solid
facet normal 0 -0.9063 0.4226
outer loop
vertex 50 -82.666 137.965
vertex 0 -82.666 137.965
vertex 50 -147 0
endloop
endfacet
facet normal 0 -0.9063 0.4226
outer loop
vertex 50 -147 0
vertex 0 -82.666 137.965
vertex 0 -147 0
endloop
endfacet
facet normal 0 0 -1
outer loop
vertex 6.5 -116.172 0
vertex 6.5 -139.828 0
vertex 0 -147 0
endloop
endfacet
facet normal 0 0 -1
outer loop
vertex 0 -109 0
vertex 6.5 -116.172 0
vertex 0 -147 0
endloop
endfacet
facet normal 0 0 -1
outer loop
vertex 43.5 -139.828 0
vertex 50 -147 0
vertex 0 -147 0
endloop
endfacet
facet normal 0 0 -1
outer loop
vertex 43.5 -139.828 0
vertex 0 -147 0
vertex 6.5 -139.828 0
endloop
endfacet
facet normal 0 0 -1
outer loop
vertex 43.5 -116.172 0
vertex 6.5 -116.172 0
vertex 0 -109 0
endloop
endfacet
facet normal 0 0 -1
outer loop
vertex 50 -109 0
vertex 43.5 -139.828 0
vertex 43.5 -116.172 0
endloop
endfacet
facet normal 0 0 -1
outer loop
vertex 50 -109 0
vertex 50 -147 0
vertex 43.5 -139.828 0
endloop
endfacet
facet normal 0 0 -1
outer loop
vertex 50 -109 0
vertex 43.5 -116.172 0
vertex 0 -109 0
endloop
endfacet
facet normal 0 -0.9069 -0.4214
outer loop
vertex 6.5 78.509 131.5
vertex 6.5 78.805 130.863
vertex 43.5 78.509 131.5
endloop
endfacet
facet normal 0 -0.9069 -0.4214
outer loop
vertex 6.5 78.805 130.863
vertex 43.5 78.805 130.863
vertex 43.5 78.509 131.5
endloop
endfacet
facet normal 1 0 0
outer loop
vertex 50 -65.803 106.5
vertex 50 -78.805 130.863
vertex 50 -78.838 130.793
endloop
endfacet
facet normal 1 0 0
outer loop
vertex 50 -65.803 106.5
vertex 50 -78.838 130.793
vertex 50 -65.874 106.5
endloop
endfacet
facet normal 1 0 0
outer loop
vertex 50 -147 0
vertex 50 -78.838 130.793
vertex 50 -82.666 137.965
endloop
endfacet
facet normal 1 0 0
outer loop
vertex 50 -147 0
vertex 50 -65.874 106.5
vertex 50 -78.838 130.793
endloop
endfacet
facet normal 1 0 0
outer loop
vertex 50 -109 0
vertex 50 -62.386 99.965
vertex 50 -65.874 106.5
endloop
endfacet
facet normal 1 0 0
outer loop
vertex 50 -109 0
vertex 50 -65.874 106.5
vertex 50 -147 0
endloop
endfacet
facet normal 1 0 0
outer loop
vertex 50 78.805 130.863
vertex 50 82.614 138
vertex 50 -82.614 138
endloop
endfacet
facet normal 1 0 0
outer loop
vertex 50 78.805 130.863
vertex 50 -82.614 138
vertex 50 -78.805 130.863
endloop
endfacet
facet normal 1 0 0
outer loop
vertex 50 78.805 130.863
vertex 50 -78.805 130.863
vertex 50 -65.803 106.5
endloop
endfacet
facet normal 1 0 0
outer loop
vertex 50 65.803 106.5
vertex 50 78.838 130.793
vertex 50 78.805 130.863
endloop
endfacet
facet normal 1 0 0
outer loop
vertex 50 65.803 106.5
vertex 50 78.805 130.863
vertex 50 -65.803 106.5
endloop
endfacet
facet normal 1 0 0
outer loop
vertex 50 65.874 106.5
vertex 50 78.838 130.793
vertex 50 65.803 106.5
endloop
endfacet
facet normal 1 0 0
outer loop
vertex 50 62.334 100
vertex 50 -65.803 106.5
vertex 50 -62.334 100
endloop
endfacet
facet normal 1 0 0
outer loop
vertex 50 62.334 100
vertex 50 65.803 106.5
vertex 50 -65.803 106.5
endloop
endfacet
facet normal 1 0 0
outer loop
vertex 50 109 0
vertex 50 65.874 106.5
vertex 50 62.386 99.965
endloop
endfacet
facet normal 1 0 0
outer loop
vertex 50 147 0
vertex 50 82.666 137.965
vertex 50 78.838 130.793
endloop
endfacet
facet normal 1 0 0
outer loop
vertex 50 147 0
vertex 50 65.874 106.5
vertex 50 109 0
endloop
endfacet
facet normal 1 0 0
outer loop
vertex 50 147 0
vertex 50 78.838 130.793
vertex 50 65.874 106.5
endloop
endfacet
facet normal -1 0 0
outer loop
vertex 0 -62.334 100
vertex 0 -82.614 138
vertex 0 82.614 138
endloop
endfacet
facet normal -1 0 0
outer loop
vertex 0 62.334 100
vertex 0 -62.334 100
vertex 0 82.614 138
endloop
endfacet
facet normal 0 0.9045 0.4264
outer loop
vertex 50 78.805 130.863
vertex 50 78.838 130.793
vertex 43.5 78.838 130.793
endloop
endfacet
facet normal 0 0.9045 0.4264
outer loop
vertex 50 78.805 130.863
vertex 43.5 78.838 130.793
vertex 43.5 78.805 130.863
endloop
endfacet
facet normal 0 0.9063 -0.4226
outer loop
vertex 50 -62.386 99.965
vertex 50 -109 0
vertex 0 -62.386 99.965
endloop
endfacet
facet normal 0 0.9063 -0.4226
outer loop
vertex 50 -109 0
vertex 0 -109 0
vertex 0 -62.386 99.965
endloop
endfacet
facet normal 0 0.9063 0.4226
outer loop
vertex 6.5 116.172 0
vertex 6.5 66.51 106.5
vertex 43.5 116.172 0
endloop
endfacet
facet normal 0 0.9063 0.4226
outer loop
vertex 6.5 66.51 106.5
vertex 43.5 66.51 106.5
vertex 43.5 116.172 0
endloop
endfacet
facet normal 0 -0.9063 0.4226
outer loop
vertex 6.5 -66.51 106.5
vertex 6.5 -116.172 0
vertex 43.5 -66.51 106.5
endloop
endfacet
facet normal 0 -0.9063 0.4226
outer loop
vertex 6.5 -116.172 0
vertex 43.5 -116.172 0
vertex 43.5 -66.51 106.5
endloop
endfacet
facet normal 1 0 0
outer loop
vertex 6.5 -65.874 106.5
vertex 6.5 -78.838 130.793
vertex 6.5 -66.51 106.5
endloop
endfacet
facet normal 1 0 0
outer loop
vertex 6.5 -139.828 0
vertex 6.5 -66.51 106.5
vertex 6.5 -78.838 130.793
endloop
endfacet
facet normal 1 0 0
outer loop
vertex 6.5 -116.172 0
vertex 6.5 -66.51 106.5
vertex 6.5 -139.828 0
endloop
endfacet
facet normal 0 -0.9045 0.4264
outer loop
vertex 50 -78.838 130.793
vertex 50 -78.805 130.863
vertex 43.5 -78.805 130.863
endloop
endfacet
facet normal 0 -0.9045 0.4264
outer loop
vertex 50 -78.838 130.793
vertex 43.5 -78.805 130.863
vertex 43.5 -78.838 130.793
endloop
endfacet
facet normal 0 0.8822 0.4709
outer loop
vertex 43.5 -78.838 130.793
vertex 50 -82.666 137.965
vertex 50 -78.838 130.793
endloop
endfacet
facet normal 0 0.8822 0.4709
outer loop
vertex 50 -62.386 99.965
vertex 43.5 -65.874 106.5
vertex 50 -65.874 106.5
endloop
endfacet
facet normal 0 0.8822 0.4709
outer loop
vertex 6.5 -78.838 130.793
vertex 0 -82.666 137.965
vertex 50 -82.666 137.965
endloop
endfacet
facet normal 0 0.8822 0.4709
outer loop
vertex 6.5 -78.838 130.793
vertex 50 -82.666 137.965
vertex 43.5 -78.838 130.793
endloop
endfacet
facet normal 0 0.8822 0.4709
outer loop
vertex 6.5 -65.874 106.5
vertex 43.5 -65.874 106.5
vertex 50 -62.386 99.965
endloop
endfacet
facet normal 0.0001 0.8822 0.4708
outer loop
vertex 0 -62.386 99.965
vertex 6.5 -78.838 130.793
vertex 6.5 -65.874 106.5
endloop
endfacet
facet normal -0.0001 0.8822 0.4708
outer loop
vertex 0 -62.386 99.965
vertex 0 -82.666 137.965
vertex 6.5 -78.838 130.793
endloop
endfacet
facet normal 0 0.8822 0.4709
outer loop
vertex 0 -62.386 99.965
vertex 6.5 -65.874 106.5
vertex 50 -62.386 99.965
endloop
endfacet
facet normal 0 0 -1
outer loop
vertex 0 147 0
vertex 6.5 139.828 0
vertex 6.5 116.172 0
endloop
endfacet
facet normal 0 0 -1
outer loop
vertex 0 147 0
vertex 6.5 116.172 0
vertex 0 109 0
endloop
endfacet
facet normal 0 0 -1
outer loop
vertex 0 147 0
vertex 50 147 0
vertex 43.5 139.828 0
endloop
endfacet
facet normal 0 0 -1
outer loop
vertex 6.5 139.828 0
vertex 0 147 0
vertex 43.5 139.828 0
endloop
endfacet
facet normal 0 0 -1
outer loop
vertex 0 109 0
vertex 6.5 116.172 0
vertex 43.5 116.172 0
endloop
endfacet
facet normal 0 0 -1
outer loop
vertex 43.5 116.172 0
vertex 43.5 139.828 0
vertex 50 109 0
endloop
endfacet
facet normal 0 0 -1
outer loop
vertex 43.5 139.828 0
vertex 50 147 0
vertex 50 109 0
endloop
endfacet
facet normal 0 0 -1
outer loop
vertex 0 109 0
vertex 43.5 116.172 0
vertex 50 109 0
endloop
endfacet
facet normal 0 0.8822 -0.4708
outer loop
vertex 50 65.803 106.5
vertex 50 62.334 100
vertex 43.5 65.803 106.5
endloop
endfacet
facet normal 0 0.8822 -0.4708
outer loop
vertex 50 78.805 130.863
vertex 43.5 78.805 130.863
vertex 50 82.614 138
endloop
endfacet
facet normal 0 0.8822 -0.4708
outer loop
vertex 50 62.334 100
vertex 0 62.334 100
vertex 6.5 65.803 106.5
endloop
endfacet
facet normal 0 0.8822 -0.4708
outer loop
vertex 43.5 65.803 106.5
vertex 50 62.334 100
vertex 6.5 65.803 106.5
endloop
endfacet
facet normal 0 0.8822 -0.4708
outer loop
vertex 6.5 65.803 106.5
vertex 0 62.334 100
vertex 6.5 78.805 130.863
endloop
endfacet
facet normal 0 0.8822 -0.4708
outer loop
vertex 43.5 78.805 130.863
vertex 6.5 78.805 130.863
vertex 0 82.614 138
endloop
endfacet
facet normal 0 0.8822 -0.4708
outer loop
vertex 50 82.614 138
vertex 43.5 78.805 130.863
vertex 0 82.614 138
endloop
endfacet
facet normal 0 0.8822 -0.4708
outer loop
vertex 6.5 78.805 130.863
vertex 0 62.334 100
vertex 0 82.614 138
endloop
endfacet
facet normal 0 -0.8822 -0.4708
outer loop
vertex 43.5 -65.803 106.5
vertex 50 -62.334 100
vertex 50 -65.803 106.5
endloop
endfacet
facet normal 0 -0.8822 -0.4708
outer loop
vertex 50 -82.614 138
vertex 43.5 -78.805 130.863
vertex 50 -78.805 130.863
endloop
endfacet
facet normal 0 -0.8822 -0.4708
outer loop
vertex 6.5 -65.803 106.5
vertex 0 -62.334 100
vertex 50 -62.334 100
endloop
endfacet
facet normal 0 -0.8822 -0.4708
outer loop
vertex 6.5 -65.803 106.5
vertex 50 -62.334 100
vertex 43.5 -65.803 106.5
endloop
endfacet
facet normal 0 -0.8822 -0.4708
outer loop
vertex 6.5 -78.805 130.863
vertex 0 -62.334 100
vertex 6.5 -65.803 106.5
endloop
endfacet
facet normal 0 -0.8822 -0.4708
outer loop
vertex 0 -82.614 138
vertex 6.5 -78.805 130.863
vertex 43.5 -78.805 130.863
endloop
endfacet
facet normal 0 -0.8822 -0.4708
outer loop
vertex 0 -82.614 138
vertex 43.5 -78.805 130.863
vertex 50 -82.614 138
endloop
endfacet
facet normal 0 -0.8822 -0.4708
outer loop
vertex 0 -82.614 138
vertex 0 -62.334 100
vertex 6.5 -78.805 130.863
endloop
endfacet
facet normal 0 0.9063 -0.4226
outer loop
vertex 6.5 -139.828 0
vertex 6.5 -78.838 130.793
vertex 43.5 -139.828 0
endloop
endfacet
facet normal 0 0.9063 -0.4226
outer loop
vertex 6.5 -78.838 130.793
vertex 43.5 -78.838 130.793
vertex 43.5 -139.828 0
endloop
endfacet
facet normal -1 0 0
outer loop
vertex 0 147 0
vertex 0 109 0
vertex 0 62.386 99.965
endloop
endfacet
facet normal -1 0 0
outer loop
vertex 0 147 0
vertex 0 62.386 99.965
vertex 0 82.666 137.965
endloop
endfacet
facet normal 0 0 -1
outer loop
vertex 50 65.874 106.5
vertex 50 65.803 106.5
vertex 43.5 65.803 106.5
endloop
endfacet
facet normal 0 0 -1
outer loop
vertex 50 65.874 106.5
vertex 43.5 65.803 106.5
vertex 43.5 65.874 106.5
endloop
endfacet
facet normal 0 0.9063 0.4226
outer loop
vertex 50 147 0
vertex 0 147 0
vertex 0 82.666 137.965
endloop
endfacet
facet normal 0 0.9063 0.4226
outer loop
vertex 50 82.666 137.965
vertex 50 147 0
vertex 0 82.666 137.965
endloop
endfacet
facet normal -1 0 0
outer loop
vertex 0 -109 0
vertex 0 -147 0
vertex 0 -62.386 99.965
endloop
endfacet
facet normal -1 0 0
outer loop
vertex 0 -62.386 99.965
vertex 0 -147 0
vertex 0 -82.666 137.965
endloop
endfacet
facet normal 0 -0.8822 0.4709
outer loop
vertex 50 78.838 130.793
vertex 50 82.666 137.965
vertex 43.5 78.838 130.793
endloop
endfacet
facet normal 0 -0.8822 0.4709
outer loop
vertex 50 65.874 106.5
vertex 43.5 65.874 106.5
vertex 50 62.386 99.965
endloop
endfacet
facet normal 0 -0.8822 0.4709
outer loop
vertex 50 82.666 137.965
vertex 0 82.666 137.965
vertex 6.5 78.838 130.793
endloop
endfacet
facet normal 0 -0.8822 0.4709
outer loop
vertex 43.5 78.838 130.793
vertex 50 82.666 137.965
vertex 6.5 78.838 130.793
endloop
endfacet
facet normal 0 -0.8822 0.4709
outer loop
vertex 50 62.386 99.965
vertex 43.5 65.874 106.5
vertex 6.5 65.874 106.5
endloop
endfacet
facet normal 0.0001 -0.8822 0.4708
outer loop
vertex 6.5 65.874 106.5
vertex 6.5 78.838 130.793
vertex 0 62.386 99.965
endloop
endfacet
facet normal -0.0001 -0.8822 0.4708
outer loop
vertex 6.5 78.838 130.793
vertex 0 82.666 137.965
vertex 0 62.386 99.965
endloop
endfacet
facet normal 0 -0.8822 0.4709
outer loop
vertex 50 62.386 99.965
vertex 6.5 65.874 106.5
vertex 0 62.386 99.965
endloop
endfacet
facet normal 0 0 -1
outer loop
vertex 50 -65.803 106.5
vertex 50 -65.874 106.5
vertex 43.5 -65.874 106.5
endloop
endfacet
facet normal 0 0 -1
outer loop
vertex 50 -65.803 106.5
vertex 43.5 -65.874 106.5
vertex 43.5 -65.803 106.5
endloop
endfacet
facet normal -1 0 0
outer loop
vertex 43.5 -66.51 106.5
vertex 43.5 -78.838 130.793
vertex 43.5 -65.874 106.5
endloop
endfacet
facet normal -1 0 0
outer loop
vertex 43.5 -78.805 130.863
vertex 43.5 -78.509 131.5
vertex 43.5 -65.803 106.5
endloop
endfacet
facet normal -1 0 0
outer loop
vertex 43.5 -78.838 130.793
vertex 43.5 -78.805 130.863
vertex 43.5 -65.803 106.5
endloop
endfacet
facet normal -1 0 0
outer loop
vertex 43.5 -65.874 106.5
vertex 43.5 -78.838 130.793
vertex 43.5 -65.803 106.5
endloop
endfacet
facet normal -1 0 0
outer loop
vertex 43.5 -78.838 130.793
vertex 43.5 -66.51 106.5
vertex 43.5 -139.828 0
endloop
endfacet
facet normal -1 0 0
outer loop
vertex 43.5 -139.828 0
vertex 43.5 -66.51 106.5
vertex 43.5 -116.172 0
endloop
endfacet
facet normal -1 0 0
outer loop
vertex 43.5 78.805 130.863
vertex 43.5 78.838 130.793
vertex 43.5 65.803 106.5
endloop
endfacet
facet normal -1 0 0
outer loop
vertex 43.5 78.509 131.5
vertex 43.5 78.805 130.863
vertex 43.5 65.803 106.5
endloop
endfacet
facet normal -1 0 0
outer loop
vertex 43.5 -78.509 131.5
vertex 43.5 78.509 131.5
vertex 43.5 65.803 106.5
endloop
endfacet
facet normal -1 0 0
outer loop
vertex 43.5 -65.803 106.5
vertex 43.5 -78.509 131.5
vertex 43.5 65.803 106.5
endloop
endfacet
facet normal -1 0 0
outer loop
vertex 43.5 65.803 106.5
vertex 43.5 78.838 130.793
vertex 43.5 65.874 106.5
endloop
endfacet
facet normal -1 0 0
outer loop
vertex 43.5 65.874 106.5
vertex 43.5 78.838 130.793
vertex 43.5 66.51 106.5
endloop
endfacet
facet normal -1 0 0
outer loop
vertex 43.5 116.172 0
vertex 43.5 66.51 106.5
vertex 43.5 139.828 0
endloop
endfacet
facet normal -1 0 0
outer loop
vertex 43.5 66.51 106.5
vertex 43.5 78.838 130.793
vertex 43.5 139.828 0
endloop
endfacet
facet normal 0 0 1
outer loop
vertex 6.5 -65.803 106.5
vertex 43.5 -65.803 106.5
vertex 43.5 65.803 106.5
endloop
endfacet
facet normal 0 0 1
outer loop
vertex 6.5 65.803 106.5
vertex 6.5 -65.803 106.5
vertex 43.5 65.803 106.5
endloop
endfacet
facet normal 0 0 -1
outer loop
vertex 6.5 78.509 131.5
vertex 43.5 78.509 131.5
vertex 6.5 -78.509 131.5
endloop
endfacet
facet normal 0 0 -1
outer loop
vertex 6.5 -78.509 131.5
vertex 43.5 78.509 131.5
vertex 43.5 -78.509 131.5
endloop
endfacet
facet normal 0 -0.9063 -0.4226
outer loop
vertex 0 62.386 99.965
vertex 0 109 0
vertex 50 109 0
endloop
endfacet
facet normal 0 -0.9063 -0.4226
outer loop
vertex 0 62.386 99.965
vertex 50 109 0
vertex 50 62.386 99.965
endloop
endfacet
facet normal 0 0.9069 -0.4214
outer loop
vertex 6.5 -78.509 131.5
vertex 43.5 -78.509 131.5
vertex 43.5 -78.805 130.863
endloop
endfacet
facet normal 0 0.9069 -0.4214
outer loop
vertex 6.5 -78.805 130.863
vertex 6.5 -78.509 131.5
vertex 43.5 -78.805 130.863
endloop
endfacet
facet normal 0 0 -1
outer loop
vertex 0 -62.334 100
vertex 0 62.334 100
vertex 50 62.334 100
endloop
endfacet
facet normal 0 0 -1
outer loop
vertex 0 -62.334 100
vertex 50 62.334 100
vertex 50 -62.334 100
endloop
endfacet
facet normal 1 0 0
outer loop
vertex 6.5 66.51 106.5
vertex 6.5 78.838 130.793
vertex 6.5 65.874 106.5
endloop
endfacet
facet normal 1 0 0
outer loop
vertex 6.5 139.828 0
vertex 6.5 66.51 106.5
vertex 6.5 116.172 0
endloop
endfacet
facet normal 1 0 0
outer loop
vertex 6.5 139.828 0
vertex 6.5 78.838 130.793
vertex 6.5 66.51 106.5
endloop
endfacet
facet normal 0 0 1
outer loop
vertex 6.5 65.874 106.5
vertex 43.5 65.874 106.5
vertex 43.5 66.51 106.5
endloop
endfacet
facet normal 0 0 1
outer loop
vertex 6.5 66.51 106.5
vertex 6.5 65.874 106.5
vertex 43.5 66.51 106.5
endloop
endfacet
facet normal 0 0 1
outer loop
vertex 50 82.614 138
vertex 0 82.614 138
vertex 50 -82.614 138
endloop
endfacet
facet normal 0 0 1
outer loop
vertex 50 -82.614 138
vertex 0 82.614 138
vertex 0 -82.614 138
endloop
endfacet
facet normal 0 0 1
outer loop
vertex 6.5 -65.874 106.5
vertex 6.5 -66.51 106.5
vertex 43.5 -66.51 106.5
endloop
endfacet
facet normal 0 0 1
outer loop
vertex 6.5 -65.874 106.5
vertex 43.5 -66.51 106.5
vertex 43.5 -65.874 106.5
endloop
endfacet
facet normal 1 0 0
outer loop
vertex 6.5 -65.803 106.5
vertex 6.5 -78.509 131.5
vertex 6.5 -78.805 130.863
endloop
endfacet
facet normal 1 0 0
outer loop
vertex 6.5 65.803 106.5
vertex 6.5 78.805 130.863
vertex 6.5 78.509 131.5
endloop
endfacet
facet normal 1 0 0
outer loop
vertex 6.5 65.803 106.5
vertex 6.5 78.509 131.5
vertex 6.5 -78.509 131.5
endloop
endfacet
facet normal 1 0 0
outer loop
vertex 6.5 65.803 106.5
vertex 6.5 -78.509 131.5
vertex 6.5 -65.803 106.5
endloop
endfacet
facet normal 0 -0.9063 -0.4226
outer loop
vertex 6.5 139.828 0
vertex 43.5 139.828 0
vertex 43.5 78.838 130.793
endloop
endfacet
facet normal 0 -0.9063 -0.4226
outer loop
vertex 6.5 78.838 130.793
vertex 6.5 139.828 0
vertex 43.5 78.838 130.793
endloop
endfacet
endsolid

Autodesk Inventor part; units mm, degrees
ref_plane "YZ Plane" through (0, 0, 0) normal (1, 0, 0) x (0, 1, 0)
ref_plane "XZ Plane" through (0, 0, 0) normal (0, 1, 0) x (-1, 0, 0)
ref_plane "XY Plane" through (0, 0, 0) normal (0, 0, 1) x (1, 0, 0)
sketch "Sketch1" plane through (0, 0, 0) normal (1, 0, 0) x (0, 1, 0)
  line L0 (109, 0) -> (-109, 0) construction
  line L1 (147, 0) -> (-147, 0) construction
  line L2 (109, 0) -> (215.066, 0) construction
  line L3 (109, 0) -> (62.3692, 100)
  line L4 (109, 0) -> (219.3378, 0) construction
  line L5 (-147, 0) -> (3, 0) construction
  line L6 (-109, 0) -> (-62.3692, 100)
  line L7 (-109, 0) -> (1.3378, 0) construction
  line L8 (147, 0) -> (82.6495, 138)
  line L9 (82.6495, 138) -> (-82.6495, 138)
  line L10 (-82.6495, 138) -> (-147, 0)
  line L11 (62.3692, 100) -> (-62.3692, 100)
  line L12 (147, 0) -> (109, 0)
  line L13 (-109, 0) -> (-147, 0)
  line L14 (-62.3692, 100) -> (-82.6495, 138) construction
  line L15 (62.3338, 100) -> (82.6141, 138)
  line L16 (82.6661, 137.9646) -> (62.3858, 99.9646)
  line L17 (62.3692, 100) -> (82.6495, 138) construction
  line L18 (-62.3338, 100) -> (-82.6141, 138)
  line L19 (-82.6661, 137.9646) -> (-62.3858, 99.9646)
  point P0 (0, 0)
  point P1 (0, 0)
  point P2 (0, 0)
  dimension "d0" = 218
  dimension "d1" = 294
  dimension "d5" = 115
  dimension "d9" = 65
  dimension "d10" = 38
  dimension "d11" = 100
  dimension "d12" = 0.0625
  dimension "d13" = 0.0625
  dimension "d14" = 0.0312
  dimension "d15" = 0.0312
extrude "Extrusion1" add sketch "Sketch1" along normal blind 50 contours L3 L16 L8 L12 | L11 L18 L9 L15 | L6 L13 L10 L19
sketch "Sketch2" plane through (50, 0, 0) normal (1, 0, 0) x (0, 0, -1)
  line L0 (0, 109) -> (0, 147) construction
  line L1 (0, 147) -> (-137.9646, 82.6661) construction
  line L2 (-137.9646, 82.6661) -> (-99.9646, 62.3858) construction
  line L3 (-99.9646, 62.3858) -> (0, 109) construction
  line L4 (-100, 62.3338) -> (-138, 82.6141) construction
  line L5 (-138, 82.6141) -> (-138, -82.6141) construction
  line L6 (-138, -82.6141) -> (-100, -62.3338) construction
  line L7 (-100, -62.3338) -> (-100, 62.3338) construction
  line L8 (0, -109) -> (-99.9646, -62.3858) construction
  line L9 (-99.9646, -62.3858) -> (-137.9646, -82.6661) construction
  line L10 (-137.9646, -82.6661) -> (0, -147) construction
  line L11 (0, -147) -> (0, -109) construction
  line L12 (0, 109) -> (-100, 62.3692) construction
  line L13 (-100, 62.3692) -> (-100, -62.3692) construction
  line L14 (0, -109) -> (-99.9646, -62.3858) construction
  line L15 (-100, -62.3692) -> (0, -109) construction
  line L16 (0, -147) -> (0, -109) construction
  line L17 (0, -109) -> (0, -147) construction
  line L18 (0, -147) -> (-138, -82.6495) construction
  line L19 (-137.9646, -82.6661) -> (0, -147) construction
  line L20 (-138, -82.6495) -> (-138, 82.6495) construction
  line L21 (0, 109) -> (0, 147) construction
  line L22 (-138, 82.6495) -> (0, 147) construction
  line L23 (0, 147) -> (0, 109) construction
  line L24 (-106.5, 66.5102) -> (0, 116.172)
  line L25 (0, 139.828) -> (-131.5, 78.5086)
  line L26 (-131.5, 78.5086) -> (-131.5, -78.5086)
  line L27 (-131.5, -78.5086) -> (0, -139.828)
  line L28 (0, -116.172) -> (-106.5, -66.5102)
  line L29 (-106.5, -66.5102) -> (-106.5, 66.5102)
  line L30 (0, -147) -> (0, -109) projected
  line L31 (0, 139.828) -> (0, 116.172)
  line L32 (0, -116.172) -> (0, -139.828)
  point P0 (0, 0)
  dimension "d18" = 6.5
extrude "Extrusion2" cut sketch "Sketch2" against normal blind 43.5
extrude "Extrusion3" add sketch "Sketch2" against normal blind 6.5
properties part number "FrameMainMotorMount"
